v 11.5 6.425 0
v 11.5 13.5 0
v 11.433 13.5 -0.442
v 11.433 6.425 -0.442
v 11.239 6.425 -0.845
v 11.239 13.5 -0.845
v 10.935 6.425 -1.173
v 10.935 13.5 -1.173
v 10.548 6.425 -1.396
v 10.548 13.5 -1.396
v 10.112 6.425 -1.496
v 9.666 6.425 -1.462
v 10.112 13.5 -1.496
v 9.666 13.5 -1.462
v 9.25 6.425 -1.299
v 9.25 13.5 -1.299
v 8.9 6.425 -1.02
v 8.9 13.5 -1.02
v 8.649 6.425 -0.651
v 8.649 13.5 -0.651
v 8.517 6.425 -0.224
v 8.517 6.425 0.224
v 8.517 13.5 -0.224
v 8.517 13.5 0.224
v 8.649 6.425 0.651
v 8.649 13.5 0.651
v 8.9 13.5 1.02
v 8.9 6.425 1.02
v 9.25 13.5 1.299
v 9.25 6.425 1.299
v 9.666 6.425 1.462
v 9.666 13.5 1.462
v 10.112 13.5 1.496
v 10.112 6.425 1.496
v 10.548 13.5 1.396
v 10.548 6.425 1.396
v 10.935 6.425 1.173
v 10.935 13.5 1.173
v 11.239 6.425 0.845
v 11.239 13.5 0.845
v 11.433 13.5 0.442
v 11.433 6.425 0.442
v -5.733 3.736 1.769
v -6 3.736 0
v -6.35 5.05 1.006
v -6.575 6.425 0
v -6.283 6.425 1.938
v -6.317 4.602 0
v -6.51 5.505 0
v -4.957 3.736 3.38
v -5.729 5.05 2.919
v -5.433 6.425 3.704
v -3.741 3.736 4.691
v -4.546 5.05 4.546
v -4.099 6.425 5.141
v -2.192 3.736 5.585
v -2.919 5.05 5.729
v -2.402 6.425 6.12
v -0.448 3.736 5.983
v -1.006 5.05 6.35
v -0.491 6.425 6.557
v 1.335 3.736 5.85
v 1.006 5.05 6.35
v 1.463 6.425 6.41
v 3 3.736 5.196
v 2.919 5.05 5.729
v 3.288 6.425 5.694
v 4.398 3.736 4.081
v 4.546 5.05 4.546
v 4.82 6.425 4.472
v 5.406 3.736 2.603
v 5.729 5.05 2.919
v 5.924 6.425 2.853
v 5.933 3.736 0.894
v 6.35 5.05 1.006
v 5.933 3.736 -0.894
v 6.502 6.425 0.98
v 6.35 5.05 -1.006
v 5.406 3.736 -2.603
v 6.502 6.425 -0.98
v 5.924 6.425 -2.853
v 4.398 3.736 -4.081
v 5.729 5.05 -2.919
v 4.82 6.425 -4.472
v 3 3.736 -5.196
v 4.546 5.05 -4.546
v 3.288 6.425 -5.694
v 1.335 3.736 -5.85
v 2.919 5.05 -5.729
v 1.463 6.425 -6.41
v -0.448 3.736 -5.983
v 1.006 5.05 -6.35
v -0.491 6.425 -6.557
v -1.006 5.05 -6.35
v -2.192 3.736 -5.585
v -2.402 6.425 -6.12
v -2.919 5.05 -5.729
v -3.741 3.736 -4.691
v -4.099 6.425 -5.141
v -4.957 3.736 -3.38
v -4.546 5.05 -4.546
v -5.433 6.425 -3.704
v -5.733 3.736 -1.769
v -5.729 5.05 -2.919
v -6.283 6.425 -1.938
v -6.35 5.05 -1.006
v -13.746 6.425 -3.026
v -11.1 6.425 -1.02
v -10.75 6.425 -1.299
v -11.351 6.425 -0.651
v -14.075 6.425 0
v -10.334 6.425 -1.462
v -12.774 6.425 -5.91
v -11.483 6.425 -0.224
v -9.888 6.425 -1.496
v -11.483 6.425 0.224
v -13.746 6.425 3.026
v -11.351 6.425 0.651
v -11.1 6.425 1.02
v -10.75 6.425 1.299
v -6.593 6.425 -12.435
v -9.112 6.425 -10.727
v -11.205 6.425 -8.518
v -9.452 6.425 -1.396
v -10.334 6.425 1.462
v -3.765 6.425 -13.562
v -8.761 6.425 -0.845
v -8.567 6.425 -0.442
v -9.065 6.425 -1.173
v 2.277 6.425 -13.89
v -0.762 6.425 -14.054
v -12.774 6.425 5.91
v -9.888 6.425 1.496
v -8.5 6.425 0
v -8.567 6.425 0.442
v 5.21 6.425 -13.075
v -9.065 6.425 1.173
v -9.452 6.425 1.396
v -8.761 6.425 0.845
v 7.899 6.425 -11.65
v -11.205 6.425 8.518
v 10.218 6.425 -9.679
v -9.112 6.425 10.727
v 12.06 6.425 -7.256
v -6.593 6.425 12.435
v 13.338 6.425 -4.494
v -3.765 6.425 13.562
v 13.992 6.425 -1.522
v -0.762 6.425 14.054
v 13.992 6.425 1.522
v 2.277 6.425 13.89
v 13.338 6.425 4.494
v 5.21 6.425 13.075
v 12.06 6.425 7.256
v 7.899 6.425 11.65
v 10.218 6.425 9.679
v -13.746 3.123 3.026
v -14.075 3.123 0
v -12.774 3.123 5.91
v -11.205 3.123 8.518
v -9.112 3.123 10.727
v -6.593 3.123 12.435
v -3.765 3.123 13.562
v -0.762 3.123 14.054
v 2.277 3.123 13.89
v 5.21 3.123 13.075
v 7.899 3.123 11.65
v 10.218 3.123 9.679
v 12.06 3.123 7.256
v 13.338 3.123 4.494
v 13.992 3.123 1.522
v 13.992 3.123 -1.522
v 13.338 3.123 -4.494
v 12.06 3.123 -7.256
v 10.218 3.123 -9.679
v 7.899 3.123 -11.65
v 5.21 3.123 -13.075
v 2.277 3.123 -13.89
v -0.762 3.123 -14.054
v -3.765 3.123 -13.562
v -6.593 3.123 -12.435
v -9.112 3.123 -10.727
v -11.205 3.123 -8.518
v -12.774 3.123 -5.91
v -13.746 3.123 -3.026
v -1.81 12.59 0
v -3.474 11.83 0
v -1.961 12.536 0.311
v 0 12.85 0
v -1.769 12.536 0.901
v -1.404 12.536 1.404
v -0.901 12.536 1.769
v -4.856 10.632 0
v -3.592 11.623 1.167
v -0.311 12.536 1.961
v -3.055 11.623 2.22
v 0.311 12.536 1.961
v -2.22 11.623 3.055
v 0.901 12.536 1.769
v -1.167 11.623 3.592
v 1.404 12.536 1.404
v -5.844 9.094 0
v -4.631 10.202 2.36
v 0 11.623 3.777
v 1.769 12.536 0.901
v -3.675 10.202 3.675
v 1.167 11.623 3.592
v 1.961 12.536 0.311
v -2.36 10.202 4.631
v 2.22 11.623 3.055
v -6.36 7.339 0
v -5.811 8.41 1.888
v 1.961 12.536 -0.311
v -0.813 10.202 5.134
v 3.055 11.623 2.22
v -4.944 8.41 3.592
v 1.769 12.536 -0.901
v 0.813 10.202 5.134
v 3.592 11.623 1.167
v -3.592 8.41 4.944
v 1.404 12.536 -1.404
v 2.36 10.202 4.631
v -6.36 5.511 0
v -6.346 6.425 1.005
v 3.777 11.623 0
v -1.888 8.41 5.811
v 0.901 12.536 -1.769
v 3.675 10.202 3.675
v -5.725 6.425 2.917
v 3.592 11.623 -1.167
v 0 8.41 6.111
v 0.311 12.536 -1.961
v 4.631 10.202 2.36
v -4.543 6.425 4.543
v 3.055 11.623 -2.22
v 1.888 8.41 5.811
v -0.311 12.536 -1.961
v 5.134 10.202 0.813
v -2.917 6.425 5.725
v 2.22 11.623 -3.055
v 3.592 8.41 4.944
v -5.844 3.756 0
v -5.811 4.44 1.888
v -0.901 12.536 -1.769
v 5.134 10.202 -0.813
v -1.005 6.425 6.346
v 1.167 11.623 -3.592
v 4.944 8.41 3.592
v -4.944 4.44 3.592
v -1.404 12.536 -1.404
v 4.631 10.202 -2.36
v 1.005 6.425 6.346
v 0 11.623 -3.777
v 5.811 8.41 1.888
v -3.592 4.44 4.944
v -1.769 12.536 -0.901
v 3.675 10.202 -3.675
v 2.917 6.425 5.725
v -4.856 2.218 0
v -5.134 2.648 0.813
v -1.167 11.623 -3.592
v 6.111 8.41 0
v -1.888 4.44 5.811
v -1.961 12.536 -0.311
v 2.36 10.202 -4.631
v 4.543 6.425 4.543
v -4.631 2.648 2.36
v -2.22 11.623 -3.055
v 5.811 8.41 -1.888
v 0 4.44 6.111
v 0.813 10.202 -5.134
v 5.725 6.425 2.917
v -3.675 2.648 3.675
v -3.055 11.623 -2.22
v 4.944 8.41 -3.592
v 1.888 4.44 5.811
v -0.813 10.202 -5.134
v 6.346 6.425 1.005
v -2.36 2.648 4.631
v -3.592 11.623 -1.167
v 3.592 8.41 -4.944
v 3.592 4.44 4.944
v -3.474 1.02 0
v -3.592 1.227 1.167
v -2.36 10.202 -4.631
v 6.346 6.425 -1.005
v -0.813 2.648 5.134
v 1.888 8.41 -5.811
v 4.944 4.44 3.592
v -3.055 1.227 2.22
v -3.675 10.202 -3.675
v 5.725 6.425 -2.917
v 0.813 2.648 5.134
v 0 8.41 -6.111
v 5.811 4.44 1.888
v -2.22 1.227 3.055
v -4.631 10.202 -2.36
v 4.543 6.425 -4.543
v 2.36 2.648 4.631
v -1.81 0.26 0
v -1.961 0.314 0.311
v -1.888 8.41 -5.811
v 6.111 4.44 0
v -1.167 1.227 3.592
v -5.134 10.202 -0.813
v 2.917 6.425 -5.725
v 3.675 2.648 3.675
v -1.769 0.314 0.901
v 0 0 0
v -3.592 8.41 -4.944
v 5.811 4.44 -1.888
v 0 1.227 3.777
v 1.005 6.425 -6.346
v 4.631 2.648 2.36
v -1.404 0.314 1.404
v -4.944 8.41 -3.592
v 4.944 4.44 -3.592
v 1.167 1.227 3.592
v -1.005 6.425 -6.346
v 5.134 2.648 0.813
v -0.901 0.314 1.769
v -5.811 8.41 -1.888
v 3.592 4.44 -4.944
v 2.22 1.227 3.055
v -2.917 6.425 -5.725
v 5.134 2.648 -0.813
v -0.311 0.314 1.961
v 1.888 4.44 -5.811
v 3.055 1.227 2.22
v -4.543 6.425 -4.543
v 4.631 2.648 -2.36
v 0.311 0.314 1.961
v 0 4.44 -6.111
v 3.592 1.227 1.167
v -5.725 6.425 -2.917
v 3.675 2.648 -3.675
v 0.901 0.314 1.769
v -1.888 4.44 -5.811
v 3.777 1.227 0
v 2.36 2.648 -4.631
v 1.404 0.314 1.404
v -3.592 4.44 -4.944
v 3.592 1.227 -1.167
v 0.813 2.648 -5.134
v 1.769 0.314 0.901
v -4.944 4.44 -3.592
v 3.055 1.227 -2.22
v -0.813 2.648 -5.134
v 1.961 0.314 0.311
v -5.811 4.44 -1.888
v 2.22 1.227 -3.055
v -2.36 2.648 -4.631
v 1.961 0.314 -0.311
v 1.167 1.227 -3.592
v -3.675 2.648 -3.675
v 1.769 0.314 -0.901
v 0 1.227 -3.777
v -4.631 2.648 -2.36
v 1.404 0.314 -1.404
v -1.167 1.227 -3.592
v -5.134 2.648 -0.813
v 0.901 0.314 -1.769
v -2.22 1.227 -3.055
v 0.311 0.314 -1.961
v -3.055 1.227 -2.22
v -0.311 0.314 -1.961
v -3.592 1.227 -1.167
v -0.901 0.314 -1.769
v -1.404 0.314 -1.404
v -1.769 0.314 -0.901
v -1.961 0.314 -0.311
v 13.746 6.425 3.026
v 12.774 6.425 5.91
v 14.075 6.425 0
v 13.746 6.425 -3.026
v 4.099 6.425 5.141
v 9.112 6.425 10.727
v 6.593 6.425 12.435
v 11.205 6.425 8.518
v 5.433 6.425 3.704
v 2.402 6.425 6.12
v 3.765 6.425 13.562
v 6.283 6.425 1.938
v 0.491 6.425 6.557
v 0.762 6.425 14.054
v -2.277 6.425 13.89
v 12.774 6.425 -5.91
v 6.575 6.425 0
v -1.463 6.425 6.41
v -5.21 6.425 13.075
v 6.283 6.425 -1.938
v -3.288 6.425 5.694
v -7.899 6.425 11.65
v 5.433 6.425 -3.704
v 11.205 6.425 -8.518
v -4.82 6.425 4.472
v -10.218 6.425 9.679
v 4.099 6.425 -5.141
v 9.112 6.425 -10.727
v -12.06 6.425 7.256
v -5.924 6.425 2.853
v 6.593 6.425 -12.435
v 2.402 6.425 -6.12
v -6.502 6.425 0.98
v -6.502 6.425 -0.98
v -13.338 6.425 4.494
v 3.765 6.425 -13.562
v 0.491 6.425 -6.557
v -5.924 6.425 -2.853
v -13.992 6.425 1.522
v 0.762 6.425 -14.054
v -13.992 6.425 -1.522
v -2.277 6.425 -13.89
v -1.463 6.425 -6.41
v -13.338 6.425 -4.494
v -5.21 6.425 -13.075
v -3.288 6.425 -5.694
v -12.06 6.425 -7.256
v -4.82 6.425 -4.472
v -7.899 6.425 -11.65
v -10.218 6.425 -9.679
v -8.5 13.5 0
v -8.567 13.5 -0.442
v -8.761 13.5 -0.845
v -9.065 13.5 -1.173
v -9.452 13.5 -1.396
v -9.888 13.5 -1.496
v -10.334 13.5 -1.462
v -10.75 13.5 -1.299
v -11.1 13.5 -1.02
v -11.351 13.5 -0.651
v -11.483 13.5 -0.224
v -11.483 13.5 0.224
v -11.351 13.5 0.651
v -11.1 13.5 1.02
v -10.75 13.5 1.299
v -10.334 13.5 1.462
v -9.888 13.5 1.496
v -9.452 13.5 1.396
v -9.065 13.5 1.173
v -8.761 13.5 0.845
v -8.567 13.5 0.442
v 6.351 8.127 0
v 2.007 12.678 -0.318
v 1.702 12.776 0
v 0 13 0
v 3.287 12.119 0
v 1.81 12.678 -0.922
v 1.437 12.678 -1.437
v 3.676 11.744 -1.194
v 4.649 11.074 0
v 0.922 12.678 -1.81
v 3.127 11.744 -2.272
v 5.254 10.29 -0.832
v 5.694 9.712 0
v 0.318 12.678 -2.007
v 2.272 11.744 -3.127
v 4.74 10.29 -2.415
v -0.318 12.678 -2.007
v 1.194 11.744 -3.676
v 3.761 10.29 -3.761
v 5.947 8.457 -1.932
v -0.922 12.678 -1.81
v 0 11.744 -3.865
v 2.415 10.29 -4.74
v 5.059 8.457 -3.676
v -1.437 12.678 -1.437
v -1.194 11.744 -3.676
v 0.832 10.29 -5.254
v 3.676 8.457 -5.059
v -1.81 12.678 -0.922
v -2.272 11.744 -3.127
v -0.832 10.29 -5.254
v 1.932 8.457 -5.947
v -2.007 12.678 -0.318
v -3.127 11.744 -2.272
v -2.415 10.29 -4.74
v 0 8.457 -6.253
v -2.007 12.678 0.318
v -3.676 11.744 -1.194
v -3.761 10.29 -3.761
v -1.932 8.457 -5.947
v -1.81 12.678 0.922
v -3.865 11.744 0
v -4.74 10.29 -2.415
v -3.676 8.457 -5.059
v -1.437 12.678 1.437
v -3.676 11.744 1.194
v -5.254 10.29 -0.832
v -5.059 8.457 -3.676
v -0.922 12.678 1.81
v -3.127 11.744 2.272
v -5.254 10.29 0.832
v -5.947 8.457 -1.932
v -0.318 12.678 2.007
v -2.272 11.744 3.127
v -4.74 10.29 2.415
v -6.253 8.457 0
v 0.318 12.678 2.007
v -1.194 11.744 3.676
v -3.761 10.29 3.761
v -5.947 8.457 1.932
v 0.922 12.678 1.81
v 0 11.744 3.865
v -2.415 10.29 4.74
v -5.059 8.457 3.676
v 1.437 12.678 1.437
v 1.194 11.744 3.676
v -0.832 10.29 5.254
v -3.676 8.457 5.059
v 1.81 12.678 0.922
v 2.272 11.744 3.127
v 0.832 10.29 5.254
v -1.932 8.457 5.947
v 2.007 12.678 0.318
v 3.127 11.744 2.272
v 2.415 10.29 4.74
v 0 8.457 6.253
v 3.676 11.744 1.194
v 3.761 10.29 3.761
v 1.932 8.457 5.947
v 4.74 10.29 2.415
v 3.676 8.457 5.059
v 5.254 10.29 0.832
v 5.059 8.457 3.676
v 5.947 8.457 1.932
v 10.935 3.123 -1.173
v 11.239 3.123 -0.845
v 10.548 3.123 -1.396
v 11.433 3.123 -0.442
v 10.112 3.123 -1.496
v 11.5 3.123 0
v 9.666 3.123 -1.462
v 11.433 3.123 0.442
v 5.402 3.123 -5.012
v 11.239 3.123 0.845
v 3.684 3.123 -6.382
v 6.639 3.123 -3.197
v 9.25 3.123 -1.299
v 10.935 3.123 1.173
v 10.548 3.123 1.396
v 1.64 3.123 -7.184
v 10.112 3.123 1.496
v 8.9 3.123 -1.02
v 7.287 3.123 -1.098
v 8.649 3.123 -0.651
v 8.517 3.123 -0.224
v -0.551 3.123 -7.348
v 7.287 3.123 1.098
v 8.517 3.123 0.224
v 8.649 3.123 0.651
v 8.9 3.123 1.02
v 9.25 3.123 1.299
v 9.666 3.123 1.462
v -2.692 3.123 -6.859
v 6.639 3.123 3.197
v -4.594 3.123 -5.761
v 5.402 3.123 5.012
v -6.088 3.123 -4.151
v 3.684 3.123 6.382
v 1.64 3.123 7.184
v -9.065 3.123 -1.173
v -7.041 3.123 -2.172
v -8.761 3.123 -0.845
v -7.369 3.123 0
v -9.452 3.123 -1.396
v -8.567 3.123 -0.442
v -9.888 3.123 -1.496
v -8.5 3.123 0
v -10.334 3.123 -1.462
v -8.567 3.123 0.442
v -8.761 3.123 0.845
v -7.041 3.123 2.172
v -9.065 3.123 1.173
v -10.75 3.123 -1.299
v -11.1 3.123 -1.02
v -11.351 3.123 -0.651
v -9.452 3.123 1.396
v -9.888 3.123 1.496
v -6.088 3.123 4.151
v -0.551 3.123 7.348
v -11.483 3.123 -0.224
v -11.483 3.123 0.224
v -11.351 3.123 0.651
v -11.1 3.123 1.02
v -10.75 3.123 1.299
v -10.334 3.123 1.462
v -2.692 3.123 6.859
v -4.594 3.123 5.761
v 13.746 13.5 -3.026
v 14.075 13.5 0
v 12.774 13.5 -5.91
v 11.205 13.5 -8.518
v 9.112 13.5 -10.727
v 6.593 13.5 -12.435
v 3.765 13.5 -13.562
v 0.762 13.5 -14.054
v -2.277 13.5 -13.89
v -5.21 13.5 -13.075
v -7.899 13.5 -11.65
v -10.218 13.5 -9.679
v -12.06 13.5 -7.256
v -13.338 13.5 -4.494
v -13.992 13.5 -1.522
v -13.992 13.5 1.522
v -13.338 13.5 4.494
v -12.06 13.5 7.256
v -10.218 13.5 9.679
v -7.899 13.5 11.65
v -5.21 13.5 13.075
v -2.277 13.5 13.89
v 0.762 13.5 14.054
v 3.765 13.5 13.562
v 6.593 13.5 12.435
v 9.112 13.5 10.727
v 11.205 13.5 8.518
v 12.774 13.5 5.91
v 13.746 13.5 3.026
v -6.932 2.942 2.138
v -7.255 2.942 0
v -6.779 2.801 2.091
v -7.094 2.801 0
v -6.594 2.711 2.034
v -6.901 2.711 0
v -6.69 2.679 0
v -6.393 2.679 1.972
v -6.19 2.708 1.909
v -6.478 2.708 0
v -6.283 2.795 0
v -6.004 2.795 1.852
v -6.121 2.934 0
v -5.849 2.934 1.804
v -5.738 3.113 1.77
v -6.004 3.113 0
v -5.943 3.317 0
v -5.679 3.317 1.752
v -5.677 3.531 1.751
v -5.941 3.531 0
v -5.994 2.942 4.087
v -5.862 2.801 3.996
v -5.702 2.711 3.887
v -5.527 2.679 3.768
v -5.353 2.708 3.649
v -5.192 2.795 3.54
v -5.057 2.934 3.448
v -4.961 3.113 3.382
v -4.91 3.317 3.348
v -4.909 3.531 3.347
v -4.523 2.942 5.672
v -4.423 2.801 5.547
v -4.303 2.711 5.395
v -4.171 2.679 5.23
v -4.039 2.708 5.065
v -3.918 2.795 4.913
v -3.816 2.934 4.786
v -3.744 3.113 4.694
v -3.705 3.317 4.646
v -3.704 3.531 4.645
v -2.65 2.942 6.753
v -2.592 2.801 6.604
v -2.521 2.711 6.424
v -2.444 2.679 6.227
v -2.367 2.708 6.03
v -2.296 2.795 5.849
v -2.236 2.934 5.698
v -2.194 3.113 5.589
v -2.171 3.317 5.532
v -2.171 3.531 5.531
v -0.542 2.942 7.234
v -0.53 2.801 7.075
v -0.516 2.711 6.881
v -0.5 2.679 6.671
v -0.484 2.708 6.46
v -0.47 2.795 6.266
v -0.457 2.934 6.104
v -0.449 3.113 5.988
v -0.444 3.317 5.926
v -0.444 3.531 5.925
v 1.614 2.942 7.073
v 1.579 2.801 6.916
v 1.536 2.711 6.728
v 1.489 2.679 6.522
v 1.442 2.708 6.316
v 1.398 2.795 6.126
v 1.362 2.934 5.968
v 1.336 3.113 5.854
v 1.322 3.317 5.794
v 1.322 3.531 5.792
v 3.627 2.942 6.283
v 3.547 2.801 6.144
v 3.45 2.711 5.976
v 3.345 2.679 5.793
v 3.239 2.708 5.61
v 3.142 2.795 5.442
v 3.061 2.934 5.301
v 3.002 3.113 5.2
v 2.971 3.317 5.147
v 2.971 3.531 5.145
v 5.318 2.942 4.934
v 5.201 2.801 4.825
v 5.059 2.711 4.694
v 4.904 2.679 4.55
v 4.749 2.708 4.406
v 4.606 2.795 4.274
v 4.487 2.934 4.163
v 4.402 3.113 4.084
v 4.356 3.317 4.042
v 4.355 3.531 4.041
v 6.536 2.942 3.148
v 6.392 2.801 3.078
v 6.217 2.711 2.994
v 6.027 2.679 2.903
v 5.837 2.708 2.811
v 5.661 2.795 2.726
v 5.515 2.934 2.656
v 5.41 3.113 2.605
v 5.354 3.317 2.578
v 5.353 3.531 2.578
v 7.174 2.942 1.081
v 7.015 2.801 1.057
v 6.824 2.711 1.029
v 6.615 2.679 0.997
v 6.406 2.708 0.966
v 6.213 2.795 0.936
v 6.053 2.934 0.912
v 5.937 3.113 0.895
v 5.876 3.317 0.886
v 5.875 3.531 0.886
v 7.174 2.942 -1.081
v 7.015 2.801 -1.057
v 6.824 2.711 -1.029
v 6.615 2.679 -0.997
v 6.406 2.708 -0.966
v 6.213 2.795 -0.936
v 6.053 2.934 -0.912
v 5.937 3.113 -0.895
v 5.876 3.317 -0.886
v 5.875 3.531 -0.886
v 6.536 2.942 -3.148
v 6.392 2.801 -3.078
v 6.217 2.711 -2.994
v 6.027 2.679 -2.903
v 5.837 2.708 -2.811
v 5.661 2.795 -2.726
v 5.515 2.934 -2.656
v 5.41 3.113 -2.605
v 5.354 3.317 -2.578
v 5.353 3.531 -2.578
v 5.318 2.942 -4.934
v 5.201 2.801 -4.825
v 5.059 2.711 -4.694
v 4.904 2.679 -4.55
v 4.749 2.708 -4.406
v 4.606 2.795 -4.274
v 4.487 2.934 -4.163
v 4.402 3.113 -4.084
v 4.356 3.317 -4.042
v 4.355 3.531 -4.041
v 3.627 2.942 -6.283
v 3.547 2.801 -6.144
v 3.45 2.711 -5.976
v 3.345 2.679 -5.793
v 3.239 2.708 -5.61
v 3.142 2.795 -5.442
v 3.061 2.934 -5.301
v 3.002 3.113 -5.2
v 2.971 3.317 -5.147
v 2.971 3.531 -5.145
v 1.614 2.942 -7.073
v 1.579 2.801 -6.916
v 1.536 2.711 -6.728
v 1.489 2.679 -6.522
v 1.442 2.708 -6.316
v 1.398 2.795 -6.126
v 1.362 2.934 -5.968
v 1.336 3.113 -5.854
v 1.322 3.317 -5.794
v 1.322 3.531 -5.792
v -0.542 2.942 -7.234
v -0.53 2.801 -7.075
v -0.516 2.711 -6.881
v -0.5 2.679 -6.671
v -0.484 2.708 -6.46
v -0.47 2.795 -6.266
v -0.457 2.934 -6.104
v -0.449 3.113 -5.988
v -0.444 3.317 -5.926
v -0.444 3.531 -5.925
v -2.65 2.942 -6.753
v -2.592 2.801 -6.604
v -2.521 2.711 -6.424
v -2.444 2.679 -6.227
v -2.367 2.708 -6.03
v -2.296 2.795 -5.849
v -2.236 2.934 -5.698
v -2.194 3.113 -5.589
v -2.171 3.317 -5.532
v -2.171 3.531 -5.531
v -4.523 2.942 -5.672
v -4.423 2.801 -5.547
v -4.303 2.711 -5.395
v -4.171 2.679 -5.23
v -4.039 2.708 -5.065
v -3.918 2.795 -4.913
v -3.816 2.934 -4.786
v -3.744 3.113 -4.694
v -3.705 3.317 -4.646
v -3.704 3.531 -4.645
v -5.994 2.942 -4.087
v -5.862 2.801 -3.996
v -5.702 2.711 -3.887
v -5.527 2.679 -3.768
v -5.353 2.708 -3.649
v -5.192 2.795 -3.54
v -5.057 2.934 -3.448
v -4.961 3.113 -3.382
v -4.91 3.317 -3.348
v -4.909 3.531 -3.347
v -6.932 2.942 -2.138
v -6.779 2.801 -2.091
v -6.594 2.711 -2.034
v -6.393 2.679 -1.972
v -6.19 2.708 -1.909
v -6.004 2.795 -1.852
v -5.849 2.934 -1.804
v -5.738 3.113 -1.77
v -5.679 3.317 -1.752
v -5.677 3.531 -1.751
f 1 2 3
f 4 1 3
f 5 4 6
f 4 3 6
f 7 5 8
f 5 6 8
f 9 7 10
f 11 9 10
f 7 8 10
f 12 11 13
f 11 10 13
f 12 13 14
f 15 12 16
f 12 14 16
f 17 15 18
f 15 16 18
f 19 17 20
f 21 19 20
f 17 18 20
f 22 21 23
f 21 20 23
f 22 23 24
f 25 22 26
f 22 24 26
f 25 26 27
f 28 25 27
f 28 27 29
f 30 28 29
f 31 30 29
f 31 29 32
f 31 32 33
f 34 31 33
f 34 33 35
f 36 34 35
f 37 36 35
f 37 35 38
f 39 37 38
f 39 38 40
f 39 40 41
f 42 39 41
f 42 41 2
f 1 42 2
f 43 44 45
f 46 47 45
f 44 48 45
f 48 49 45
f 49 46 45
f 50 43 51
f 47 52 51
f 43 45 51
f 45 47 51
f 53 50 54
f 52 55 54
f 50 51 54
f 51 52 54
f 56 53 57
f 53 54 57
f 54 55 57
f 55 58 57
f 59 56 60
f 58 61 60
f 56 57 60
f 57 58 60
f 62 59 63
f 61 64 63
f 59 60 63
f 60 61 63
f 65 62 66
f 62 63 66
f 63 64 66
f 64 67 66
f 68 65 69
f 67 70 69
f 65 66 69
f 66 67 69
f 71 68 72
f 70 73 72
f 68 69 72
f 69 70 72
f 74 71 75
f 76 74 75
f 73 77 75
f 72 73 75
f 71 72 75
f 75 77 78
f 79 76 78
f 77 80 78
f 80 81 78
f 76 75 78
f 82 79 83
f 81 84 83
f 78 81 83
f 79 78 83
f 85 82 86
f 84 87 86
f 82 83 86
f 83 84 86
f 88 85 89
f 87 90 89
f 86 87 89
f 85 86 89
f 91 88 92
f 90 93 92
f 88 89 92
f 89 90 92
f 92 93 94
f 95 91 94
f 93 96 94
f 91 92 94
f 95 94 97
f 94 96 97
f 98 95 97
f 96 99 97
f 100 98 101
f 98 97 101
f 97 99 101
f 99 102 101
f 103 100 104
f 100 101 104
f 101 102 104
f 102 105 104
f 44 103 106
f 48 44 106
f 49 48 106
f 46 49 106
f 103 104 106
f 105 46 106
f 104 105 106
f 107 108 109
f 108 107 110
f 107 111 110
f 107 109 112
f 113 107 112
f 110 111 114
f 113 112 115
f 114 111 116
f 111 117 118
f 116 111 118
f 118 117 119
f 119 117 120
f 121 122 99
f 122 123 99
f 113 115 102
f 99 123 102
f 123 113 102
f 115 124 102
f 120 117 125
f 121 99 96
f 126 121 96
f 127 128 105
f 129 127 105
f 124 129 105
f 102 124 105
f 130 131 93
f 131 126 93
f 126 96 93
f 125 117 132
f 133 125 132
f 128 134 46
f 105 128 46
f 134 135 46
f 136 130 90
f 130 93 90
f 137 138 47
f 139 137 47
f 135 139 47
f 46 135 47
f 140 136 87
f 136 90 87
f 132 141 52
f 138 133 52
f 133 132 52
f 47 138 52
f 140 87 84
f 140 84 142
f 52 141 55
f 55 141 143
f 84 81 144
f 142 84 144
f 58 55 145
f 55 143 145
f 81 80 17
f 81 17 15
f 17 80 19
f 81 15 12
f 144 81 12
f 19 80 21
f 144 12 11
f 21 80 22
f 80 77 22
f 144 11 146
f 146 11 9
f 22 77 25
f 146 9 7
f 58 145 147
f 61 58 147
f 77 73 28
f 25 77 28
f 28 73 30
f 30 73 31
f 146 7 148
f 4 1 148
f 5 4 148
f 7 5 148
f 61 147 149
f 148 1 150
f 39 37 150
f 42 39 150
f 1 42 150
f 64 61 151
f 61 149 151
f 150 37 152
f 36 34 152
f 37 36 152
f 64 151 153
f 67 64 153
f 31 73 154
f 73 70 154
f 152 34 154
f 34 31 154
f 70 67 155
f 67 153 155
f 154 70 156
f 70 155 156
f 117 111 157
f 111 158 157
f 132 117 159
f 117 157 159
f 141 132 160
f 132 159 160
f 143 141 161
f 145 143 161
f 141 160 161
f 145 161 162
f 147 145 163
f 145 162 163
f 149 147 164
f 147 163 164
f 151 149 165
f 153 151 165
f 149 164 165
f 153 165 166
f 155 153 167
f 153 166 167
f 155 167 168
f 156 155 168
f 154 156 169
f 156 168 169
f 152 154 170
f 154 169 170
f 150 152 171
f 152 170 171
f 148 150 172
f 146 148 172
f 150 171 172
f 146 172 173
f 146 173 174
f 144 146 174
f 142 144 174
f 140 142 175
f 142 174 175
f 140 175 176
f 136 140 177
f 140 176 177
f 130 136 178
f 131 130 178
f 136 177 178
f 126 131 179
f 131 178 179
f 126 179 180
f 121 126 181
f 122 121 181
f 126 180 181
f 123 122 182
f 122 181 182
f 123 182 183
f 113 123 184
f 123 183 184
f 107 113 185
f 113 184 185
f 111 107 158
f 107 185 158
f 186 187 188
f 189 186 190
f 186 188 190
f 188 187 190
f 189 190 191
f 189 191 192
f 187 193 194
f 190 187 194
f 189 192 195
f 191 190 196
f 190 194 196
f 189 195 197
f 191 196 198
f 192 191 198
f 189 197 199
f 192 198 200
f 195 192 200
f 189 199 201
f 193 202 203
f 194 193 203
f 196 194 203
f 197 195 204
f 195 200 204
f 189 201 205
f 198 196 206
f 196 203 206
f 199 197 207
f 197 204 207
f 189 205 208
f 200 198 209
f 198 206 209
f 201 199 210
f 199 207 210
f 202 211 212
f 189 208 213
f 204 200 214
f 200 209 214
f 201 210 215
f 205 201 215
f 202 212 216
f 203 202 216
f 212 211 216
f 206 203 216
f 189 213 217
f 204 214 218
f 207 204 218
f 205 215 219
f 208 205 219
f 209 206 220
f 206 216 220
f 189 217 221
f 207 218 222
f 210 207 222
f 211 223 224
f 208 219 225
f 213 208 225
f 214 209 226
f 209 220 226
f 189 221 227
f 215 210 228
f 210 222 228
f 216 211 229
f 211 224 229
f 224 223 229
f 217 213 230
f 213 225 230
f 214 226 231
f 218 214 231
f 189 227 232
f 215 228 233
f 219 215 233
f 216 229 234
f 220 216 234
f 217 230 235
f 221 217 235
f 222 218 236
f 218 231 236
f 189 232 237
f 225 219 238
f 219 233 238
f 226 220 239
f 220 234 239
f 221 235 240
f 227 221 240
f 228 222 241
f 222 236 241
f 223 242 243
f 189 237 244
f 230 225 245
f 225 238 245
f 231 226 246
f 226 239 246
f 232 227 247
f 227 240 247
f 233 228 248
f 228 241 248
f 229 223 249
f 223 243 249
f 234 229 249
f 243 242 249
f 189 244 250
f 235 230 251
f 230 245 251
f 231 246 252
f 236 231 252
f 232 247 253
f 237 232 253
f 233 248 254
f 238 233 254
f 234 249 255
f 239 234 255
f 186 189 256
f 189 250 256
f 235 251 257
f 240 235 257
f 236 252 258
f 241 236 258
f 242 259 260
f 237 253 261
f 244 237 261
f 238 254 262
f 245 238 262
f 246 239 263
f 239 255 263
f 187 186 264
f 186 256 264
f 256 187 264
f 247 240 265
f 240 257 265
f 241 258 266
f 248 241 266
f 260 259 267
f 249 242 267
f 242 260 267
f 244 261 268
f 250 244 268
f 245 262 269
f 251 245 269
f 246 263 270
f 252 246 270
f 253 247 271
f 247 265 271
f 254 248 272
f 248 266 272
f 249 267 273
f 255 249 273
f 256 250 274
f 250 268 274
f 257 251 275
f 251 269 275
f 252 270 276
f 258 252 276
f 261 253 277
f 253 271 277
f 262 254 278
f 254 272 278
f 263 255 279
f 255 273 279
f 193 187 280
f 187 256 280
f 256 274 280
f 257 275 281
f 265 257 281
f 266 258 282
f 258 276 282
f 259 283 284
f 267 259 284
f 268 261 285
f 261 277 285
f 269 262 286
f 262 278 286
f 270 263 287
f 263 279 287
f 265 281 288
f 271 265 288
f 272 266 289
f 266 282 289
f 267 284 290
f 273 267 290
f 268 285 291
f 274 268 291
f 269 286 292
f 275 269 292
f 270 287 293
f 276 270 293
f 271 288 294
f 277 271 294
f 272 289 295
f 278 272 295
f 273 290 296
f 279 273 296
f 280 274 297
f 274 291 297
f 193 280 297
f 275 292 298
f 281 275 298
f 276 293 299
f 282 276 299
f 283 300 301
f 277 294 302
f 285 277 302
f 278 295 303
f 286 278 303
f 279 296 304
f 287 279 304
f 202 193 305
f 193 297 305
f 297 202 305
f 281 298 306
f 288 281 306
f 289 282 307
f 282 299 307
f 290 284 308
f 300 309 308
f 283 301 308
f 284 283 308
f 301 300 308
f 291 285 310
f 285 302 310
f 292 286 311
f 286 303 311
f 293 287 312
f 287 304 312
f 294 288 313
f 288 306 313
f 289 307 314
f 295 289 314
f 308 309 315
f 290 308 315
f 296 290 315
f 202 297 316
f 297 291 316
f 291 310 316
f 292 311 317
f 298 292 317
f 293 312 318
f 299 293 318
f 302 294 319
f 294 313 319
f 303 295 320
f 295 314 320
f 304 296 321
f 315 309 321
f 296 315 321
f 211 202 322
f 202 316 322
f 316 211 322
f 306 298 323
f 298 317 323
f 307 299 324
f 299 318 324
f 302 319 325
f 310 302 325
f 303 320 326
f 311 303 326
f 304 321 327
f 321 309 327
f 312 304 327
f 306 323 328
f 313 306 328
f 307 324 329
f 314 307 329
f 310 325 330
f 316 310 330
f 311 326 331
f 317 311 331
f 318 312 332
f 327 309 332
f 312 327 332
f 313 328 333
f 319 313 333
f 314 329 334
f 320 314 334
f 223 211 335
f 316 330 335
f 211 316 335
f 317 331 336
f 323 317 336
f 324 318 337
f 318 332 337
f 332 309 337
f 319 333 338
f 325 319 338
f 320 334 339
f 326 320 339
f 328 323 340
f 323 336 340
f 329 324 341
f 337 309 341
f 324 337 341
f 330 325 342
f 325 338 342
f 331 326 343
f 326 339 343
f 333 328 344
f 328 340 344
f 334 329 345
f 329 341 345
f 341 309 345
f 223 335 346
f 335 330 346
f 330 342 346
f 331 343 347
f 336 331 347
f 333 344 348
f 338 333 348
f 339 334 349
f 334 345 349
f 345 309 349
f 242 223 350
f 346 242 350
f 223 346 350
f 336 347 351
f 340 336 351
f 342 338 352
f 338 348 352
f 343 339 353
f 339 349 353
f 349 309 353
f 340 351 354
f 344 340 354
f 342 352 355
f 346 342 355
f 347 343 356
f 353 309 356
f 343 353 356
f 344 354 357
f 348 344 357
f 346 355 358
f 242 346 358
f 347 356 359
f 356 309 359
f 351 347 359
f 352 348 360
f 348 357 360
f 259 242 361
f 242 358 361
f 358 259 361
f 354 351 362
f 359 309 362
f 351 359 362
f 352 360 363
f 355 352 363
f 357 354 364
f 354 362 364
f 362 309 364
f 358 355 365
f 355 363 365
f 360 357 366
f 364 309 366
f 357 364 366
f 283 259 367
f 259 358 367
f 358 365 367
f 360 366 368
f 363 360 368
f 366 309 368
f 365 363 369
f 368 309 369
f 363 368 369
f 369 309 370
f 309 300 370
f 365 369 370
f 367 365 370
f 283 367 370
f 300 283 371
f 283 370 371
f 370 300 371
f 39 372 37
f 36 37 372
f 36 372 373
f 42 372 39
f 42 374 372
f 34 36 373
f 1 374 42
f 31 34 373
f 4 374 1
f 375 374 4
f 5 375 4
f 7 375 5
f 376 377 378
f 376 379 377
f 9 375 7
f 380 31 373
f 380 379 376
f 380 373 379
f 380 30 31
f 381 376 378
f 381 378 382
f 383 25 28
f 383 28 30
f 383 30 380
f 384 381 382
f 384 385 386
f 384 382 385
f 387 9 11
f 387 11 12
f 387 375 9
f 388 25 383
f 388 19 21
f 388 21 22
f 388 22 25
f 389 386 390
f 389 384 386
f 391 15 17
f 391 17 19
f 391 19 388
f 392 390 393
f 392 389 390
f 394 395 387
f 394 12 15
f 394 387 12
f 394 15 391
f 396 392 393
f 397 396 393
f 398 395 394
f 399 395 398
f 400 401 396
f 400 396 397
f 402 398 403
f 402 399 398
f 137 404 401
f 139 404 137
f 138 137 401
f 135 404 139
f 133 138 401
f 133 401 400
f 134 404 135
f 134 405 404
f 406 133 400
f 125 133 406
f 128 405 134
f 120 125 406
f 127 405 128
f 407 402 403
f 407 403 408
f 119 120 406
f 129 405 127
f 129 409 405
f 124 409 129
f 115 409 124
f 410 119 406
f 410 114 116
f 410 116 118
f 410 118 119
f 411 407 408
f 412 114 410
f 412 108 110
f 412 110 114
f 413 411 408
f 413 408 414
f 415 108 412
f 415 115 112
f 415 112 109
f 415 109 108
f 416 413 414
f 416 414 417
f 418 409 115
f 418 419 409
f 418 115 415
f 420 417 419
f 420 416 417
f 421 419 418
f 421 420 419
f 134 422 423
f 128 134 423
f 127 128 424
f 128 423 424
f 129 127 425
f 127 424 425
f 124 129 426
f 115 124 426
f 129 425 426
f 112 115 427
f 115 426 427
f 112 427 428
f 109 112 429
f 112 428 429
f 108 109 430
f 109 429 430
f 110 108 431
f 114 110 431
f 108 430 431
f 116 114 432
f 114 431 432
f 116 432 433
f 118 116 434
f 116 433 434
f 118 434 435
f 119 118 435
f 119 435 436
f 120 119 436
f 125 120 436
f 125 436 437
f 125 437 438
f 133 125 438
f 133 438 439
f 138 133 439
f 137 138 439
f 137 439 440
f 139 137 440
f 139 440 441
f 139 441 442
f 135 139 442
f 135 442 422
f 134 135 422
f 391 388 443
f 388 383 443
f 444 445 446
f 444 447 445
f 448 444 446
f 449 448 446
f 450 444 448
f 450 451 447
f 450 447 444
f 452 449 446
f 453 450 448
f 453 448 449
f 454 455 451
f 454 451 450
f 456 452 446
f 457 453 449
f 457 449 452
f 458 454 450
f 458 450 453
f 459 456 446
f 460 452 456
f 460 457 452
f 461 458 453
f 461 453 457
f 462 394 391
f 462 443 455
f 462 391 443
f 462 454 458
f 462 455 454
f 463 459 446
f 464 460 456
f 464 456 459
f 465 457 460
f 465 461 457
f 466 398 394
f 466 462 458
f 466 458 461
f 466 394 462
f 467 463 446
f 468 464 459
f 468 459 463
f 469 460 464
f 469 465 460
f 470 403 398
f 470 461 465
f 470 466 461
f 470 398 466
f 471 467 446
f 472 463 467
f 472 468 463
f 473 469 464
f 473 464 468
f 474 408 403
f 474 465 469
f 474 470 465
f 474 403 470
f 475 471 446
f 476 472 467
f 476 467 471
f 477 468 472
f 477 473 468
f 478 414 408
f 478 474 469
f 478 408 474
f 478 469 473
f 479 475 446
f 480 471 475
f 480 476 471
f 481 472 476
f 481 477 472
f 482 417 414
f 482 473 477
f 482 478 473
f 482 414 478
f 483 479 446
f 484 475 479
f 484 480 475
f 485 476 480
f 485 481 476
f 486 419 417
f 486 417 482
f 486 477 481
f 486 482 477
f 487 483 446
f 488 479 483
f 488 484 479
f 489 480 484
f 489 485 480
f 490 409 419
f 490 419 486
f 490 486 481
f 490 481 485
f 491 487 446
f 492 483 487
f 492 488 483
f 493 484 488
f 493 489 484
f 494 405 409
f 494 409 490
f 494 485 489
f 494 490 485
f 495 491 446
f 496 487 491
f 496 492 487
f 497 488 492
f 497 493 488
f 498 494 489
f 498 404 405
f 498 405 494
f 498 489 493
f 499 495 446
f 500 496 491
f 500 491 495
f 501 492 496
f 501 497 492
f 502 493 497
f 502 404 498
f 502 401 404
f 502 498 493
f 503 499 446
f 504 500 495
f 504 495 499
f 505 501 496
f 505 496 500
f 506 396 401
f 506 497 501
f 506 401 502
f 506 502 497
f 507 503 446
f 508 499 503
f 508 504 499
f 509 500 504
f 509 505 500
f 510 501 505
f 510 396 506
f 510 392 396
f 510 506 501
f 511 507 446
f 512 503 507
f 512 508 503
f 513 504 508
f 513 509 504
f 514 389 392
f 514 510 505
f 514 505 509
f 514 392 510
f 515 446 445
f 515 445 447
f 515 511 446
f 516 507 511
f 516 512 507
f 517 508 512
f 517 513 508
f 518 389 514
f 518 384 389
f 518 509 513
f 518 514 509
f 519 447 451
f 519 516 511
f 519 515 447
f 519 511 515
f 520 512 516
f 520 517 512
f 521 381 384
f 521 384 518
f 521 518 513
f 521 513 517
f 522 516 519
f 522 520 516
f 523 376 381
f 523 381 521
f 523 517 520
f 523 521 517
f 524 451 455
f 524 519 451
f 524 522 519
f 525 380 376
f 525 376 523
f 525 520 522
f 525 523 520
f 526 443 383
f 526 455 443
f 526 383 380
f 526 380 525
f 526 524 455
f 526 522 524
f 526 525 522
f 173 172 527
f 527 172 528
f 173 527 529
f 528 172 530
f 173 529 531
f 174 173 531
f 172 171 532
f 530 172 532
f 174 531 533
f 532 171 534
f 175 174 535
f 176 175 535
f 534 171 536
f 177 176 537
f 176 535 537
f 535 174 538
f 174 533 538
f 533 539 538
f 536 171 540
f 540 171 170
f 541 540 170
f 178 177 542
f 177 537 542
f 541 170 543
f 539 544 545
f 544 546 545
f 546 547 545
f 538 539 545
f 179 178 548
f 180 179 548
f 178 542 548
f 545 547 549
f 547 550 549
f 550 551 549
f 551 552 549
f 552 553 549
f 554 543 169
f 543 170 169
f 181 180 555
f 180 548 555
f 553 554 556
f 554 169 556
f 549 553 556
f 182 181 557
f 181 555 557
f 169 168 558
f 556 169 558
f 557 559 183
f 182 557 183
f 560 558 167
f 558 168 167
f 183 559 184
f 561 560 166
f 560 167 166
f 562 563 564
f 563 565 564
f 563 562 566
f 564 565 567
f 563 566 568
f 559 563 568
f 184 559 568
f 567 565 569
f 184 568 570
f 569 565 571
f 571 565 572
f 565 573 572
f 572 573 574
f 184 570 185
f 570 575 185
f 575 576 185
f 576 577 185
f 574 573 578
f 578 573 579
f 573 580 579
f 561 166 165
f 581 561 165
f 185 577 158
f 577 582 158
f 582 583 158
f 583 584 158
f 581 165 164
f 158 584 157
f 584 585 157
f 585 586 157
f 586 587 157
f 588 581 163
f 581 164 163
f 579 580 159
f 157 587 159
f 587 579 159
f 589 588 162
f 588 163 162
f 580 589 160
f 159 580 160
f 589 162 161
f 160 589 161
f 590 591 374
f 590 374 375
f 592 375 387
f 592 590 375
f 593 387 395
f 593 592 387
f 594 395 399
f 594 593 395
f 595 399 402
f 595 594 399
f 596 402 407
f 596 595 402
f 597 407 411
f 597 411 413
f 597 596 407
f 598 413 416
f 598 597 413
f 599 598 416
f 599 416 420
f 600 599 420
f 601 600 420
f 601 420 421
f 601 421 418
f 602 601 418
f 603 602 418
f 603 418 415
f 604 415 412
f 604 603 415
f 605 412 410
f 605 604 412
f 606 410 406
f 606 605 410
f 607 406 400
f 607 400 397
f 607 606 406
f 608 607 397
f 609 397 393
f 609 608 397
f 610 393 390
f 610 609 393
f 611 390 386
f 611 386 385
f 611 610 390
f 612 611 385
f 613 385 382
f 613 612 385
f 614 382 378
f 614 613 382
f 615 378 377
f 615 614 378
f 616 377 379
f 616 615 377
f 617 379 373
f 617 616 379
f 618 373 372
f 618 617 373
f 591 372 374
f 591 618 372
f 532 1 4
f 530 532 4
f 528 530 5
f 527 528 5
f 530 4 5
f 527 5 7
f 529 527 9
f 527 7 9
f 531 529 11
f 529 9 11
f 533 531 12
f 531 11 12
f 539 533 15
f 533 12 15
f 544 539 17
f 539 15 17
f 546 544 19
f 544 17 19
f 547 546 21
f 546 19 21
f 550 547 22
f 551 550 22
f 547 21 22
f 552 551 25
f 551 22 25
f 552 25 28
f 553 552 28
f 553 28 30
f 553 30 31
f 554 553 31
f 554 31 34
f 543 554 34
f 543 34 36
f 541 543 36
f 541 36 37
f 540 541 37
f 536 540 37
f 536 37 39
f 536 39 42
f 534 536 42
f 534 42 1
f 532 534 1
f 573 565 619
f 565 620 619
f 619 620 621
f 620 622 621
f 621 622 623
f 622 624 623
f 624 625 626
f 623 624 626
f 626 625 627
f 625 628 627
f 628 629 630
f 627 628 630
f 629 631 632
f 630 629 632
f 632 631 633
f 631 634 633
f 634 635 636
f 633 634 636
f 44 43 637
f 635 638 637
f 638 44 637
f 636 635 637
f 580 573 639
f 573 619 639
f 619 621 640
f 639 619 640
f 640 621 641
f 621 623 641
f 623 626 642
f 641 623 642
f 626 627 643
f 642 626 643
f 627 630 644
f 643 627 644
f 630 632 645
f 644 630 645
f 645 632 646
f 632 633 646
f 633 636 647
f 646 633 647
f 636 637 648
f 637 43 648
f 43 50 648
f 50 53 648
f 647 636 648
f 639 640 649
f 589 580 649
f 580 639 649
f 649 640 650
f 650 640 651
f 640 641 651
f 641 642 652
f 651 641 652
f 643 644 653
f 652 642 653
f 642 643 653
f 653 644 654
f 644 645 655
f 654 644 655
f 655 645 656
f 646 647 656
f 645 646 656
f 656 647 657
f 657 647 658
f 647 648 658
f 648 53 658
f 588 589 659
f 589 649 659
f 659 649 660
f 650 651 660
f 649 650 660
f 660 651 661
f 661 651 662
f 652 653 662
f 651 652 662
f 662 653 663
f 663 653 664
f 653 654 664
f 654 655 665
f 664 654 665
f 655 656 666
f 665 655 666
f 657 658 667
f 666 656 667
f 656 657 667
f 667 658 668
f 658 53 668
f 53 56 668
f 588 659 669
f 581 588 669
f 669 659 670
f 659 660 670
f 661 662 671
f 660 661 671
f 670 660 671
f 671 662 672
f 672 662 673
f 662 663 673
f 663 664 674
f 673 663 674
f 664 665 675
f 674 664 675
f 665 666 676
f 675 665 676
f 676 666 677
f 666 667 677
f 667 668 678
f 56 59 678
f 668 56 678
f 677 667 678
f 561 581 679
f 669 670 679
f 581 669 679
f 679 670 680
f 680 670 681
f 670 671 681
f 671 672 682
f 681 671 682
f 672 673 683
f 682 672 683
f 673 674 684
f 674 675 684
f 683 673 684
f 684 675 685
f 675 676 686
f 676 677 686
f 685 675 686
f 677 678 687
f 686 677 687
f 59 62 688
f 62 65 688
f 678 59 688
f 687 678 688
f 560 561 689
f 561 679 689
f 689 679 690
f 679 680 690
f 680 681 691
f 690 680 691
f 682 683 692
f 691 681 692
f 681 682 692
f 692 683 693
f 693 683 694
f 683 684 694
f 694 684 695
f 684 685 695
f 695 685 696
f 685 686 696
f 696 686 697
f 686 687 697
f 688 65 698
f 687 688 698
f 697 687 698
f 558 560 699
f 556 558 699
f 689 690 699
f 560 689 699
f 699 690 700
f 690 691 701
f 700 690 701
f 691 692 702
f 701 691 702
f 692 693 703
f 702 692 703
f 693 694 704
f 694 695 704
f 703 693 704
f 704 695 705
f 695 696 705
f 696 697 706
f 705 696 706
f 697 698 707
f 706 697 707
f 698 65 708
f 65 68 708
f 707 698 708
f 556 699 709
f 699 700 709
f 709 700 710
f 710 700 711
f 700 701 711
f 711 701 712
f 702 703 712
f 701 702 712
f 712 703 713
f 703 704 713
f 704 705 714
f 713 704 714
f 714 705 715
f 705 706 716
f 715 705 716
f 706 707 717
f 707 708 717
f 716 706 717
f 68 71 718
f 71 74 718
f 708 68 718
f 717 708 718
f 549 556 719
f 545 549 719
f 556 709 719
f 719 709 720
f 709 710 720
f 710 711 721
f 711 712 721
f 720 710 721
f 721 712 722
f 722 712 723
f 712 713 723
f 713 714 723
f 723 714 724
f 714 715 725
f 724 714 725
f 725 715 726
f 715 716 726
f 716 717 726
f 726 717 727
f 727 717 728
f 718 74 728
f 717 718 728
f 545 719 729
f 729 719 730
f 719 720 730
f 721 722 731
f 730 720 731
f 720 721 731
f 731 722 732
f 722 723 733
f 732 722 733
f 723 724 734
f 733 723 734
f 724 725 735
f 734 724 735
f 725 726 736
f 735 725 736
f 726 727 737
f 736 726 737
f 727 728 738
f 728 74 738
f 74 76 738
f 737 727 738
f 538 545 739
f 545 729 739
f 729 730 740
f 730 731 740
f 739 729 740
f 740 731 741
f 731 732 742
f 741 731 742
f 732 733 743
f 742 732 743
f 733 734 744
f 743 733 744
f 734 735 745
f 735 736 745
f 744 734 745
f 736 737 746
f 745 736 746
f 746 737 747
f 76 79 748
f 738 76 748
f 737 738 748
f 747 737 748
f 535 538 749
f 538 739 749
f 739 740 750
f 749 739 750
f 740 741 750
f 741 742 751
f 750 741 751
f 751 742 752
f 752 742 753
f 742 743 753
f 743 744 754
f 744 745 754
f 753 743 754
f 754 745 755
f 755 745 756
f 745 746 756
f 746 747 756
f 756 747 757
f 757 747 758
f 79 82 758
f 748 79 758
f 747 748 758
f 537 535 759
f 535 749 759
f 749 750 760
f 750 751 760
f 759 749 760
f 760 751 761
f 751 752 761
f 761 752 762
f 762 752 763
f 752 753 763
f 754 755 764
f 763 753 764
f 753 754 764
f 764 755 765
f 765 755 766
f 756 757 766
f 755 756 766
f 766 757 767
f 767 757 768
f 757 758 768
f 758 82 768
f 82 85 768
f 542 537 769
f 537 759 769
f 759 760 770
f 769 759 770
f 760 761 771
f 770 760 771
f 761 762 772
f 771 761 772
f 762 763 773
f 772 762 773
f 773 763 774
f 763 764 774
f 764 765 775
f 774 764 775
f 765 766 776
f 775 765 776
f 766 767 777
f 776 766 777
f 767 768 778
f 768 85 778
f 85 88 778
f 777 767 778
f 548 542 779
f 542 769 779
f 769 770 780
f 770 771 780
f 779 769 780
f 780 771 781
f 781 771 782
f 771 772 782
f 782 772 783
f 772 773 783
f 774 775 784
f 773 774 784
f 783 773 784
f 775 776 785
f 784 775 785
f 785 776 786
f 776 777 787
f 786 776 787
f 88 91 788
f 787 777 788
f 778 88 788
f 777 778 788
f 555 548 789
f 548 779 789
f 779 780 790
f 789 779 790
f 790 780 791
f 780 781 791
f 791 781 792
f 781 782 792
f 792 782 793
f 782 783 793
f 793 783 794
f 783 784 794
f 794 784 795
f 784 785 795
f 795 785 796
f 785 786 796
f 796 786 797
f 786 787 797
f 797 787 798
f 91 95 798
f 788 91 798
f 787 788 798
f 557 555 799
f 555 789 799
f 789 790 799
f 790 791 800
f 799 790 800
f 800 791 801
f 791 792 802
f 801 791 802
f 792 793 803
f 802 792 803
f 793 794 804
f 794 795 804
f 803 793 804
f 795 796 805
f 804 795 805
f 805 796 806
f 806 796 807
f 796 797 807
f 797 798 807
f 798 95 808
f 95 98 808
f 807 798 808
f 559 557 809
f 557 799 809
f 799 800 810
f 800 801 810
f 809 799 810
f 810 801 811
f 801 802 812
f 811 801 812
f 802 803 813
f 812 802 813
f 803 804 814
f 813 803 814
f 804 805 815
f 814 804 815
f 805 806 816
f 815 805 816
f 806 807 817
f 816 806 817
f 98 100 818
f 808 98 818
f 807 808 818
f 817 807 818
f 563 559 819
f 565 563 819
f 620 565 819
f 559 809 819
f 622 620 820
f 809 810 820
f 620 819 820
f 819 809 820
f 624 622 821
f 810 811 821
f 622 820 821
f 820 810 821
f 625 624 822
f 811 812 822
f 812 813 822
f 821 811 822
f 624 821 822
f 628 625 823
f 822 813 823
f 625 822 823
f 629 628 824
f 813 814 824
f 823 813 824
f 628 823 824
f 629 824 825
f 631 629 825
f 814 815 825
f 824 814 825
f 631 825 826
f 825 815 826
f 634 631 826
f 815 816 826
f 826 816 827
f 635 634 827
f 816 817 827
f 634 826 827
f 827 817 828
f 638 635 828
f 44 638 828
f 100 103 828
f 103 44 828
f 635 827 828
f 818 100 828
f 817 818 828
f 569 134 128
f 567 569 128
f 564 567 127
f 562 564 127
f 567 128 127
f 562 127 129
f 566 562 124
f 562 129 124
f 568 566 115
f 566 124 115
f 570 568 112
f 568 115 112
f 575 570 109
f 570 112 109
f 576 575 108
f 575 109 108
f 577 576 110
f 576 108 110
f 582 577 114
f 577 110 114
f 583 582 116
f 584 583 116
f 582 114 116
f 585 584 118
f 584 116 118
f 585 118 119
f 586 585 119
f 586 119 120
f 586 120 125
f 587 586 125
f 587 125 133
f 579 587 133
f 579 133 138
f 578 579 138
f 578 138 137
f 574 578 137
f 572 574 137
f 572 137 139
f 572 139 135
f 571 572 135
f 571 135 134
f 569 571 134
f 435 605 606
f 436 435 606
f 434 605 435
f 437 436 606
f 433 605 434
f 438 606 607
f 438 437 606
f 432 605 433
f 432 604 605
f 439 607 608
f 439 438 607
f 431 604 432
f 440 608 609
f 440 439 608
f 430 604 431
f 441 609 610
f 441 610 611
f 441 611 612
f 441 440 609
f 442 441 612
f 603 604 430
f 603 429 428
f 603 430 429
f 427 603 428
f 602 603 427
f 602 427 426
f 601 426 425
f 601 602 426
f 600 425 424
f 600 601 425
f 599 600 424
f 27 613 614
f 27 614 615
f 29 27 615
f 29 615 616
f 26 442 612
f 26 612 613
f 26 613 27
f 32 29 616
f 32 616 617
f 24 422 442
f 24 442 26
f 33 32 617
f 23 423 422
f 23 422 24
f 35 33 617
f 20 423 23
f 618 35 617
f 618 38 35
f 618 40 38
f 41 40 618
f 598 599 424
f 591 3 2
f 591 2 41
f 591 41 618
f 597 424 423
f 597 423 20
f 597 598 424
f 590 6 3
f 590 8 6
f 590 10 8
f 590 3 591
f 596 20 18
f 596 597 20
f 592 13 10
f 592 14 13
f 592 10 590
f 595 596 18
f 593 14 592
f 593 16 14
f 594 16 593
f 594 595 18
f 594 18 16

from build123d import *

# Parameters (mm, degrees)
SKETCH2_R          = 1.5
CUT_EXTRUDE1_DEPTH = 25
SKETCH3_R          = 14.075
CUT_EXTRUDE2_DEPTH = 1


with BuildPart() as part:
    # Sketch1 → Revolve1 (revolve)
    with BuildSketch(Plane.XY):
        with BuildLine():
            Line((0, 0), (0, 12.85))
            ThreePointArc((0, 12.85), (-6.425, 6.425), (0, 0))
        make_face()
    revolve(axis=Axis((0, 0, 0), (0, 1, 0)))


with BuildPart() as body_2:
    # Sketch1<3> → Revolve2 (revolve)
    with BuildSketch(Plane.XY):
        with BuildLine():
            Line((14.075, 6.425), (14.075, 14.5))
            Line((14.075, 14.5), (0, 14.5))
            Line((0, 14.5), (0, 13))
            ThreePointArc((0, 13), (4.649227086, 11.074227086), (6.575, 6.425))
            Line((6.575, 6.425), (14.075, 6.425))
        make_face()
    revolve(axis=Axis((0, 0, 0), (0, 1, 0)))


with BuildPart() as body_3:
    # Sketch1<4> → Revolve3 (revolve)
    with BuildSketch(Plane.XY):
        with BuildLine():
            Line((-14.075, 3.122561847), (-7.368821293, 3.122561847))
            ThreePointArc((-7.368821293, 3.122561847), (-6.377682645, 2.744879202), (-6, 3.736017851))
            ThreePointArc((-6, 3.736017851), (-6.429643264, 5.050113641), (-6.575, 6.425))
            Line((-6.575, 6.425), (-14.075, 6.425))
            Line((-14.075, 6.425), (-14.075, 3.122561847))
        make_face()
    revolve(axis=Axis((0, 0, 0), (0, 1, 0)))


with BuildPart() as cut_extrude1_tool:
    # Sketch2 → Cut-Extrude1 (new body)
    with BuildSketch(Plane(origin=(0, 14.5, 0), x_dir=(1, 0, 0), z_dir=(0, 1, 0))):
        with Locations((-10, 0)):
            Circle(SKETCH2_R)
        with Locations((10, 0)):
            Circle(SKETCH2_R)
    extrude(amount=-CUT_EXTRUDE1_DEPTH)


with BuildPart() as body_2_1:
    add(body_2.part)

    # Cut-Extrude1: cut by cut_extrude1_tool
    add(cut_extrude1_tool.part, mode=Mode.SUBTRACT)

    # Sketch3 → Cut-Extrude2 (cut)
    with BuildSketch(Plane(origin=(0, 14.5, 0), x_dir=(1, 0, 0), z_dir=(0, 1, 0))):
        Circle(SKETCH3_R)
    extrude(amount=-CUT_EXTRUDE2_DEPTH, mode=Mode.SUBTRACT)


with BuildPart() as body_3_1:
    add(body_3.part)

    # Cut-Extrude1: cut by cut_extrude1_tool
    add(cut_extrude1_tool.part, mode=Mode.SUBTRACT)


solid = Compound([part.part, body_2_1.part, body_3_1.part])
